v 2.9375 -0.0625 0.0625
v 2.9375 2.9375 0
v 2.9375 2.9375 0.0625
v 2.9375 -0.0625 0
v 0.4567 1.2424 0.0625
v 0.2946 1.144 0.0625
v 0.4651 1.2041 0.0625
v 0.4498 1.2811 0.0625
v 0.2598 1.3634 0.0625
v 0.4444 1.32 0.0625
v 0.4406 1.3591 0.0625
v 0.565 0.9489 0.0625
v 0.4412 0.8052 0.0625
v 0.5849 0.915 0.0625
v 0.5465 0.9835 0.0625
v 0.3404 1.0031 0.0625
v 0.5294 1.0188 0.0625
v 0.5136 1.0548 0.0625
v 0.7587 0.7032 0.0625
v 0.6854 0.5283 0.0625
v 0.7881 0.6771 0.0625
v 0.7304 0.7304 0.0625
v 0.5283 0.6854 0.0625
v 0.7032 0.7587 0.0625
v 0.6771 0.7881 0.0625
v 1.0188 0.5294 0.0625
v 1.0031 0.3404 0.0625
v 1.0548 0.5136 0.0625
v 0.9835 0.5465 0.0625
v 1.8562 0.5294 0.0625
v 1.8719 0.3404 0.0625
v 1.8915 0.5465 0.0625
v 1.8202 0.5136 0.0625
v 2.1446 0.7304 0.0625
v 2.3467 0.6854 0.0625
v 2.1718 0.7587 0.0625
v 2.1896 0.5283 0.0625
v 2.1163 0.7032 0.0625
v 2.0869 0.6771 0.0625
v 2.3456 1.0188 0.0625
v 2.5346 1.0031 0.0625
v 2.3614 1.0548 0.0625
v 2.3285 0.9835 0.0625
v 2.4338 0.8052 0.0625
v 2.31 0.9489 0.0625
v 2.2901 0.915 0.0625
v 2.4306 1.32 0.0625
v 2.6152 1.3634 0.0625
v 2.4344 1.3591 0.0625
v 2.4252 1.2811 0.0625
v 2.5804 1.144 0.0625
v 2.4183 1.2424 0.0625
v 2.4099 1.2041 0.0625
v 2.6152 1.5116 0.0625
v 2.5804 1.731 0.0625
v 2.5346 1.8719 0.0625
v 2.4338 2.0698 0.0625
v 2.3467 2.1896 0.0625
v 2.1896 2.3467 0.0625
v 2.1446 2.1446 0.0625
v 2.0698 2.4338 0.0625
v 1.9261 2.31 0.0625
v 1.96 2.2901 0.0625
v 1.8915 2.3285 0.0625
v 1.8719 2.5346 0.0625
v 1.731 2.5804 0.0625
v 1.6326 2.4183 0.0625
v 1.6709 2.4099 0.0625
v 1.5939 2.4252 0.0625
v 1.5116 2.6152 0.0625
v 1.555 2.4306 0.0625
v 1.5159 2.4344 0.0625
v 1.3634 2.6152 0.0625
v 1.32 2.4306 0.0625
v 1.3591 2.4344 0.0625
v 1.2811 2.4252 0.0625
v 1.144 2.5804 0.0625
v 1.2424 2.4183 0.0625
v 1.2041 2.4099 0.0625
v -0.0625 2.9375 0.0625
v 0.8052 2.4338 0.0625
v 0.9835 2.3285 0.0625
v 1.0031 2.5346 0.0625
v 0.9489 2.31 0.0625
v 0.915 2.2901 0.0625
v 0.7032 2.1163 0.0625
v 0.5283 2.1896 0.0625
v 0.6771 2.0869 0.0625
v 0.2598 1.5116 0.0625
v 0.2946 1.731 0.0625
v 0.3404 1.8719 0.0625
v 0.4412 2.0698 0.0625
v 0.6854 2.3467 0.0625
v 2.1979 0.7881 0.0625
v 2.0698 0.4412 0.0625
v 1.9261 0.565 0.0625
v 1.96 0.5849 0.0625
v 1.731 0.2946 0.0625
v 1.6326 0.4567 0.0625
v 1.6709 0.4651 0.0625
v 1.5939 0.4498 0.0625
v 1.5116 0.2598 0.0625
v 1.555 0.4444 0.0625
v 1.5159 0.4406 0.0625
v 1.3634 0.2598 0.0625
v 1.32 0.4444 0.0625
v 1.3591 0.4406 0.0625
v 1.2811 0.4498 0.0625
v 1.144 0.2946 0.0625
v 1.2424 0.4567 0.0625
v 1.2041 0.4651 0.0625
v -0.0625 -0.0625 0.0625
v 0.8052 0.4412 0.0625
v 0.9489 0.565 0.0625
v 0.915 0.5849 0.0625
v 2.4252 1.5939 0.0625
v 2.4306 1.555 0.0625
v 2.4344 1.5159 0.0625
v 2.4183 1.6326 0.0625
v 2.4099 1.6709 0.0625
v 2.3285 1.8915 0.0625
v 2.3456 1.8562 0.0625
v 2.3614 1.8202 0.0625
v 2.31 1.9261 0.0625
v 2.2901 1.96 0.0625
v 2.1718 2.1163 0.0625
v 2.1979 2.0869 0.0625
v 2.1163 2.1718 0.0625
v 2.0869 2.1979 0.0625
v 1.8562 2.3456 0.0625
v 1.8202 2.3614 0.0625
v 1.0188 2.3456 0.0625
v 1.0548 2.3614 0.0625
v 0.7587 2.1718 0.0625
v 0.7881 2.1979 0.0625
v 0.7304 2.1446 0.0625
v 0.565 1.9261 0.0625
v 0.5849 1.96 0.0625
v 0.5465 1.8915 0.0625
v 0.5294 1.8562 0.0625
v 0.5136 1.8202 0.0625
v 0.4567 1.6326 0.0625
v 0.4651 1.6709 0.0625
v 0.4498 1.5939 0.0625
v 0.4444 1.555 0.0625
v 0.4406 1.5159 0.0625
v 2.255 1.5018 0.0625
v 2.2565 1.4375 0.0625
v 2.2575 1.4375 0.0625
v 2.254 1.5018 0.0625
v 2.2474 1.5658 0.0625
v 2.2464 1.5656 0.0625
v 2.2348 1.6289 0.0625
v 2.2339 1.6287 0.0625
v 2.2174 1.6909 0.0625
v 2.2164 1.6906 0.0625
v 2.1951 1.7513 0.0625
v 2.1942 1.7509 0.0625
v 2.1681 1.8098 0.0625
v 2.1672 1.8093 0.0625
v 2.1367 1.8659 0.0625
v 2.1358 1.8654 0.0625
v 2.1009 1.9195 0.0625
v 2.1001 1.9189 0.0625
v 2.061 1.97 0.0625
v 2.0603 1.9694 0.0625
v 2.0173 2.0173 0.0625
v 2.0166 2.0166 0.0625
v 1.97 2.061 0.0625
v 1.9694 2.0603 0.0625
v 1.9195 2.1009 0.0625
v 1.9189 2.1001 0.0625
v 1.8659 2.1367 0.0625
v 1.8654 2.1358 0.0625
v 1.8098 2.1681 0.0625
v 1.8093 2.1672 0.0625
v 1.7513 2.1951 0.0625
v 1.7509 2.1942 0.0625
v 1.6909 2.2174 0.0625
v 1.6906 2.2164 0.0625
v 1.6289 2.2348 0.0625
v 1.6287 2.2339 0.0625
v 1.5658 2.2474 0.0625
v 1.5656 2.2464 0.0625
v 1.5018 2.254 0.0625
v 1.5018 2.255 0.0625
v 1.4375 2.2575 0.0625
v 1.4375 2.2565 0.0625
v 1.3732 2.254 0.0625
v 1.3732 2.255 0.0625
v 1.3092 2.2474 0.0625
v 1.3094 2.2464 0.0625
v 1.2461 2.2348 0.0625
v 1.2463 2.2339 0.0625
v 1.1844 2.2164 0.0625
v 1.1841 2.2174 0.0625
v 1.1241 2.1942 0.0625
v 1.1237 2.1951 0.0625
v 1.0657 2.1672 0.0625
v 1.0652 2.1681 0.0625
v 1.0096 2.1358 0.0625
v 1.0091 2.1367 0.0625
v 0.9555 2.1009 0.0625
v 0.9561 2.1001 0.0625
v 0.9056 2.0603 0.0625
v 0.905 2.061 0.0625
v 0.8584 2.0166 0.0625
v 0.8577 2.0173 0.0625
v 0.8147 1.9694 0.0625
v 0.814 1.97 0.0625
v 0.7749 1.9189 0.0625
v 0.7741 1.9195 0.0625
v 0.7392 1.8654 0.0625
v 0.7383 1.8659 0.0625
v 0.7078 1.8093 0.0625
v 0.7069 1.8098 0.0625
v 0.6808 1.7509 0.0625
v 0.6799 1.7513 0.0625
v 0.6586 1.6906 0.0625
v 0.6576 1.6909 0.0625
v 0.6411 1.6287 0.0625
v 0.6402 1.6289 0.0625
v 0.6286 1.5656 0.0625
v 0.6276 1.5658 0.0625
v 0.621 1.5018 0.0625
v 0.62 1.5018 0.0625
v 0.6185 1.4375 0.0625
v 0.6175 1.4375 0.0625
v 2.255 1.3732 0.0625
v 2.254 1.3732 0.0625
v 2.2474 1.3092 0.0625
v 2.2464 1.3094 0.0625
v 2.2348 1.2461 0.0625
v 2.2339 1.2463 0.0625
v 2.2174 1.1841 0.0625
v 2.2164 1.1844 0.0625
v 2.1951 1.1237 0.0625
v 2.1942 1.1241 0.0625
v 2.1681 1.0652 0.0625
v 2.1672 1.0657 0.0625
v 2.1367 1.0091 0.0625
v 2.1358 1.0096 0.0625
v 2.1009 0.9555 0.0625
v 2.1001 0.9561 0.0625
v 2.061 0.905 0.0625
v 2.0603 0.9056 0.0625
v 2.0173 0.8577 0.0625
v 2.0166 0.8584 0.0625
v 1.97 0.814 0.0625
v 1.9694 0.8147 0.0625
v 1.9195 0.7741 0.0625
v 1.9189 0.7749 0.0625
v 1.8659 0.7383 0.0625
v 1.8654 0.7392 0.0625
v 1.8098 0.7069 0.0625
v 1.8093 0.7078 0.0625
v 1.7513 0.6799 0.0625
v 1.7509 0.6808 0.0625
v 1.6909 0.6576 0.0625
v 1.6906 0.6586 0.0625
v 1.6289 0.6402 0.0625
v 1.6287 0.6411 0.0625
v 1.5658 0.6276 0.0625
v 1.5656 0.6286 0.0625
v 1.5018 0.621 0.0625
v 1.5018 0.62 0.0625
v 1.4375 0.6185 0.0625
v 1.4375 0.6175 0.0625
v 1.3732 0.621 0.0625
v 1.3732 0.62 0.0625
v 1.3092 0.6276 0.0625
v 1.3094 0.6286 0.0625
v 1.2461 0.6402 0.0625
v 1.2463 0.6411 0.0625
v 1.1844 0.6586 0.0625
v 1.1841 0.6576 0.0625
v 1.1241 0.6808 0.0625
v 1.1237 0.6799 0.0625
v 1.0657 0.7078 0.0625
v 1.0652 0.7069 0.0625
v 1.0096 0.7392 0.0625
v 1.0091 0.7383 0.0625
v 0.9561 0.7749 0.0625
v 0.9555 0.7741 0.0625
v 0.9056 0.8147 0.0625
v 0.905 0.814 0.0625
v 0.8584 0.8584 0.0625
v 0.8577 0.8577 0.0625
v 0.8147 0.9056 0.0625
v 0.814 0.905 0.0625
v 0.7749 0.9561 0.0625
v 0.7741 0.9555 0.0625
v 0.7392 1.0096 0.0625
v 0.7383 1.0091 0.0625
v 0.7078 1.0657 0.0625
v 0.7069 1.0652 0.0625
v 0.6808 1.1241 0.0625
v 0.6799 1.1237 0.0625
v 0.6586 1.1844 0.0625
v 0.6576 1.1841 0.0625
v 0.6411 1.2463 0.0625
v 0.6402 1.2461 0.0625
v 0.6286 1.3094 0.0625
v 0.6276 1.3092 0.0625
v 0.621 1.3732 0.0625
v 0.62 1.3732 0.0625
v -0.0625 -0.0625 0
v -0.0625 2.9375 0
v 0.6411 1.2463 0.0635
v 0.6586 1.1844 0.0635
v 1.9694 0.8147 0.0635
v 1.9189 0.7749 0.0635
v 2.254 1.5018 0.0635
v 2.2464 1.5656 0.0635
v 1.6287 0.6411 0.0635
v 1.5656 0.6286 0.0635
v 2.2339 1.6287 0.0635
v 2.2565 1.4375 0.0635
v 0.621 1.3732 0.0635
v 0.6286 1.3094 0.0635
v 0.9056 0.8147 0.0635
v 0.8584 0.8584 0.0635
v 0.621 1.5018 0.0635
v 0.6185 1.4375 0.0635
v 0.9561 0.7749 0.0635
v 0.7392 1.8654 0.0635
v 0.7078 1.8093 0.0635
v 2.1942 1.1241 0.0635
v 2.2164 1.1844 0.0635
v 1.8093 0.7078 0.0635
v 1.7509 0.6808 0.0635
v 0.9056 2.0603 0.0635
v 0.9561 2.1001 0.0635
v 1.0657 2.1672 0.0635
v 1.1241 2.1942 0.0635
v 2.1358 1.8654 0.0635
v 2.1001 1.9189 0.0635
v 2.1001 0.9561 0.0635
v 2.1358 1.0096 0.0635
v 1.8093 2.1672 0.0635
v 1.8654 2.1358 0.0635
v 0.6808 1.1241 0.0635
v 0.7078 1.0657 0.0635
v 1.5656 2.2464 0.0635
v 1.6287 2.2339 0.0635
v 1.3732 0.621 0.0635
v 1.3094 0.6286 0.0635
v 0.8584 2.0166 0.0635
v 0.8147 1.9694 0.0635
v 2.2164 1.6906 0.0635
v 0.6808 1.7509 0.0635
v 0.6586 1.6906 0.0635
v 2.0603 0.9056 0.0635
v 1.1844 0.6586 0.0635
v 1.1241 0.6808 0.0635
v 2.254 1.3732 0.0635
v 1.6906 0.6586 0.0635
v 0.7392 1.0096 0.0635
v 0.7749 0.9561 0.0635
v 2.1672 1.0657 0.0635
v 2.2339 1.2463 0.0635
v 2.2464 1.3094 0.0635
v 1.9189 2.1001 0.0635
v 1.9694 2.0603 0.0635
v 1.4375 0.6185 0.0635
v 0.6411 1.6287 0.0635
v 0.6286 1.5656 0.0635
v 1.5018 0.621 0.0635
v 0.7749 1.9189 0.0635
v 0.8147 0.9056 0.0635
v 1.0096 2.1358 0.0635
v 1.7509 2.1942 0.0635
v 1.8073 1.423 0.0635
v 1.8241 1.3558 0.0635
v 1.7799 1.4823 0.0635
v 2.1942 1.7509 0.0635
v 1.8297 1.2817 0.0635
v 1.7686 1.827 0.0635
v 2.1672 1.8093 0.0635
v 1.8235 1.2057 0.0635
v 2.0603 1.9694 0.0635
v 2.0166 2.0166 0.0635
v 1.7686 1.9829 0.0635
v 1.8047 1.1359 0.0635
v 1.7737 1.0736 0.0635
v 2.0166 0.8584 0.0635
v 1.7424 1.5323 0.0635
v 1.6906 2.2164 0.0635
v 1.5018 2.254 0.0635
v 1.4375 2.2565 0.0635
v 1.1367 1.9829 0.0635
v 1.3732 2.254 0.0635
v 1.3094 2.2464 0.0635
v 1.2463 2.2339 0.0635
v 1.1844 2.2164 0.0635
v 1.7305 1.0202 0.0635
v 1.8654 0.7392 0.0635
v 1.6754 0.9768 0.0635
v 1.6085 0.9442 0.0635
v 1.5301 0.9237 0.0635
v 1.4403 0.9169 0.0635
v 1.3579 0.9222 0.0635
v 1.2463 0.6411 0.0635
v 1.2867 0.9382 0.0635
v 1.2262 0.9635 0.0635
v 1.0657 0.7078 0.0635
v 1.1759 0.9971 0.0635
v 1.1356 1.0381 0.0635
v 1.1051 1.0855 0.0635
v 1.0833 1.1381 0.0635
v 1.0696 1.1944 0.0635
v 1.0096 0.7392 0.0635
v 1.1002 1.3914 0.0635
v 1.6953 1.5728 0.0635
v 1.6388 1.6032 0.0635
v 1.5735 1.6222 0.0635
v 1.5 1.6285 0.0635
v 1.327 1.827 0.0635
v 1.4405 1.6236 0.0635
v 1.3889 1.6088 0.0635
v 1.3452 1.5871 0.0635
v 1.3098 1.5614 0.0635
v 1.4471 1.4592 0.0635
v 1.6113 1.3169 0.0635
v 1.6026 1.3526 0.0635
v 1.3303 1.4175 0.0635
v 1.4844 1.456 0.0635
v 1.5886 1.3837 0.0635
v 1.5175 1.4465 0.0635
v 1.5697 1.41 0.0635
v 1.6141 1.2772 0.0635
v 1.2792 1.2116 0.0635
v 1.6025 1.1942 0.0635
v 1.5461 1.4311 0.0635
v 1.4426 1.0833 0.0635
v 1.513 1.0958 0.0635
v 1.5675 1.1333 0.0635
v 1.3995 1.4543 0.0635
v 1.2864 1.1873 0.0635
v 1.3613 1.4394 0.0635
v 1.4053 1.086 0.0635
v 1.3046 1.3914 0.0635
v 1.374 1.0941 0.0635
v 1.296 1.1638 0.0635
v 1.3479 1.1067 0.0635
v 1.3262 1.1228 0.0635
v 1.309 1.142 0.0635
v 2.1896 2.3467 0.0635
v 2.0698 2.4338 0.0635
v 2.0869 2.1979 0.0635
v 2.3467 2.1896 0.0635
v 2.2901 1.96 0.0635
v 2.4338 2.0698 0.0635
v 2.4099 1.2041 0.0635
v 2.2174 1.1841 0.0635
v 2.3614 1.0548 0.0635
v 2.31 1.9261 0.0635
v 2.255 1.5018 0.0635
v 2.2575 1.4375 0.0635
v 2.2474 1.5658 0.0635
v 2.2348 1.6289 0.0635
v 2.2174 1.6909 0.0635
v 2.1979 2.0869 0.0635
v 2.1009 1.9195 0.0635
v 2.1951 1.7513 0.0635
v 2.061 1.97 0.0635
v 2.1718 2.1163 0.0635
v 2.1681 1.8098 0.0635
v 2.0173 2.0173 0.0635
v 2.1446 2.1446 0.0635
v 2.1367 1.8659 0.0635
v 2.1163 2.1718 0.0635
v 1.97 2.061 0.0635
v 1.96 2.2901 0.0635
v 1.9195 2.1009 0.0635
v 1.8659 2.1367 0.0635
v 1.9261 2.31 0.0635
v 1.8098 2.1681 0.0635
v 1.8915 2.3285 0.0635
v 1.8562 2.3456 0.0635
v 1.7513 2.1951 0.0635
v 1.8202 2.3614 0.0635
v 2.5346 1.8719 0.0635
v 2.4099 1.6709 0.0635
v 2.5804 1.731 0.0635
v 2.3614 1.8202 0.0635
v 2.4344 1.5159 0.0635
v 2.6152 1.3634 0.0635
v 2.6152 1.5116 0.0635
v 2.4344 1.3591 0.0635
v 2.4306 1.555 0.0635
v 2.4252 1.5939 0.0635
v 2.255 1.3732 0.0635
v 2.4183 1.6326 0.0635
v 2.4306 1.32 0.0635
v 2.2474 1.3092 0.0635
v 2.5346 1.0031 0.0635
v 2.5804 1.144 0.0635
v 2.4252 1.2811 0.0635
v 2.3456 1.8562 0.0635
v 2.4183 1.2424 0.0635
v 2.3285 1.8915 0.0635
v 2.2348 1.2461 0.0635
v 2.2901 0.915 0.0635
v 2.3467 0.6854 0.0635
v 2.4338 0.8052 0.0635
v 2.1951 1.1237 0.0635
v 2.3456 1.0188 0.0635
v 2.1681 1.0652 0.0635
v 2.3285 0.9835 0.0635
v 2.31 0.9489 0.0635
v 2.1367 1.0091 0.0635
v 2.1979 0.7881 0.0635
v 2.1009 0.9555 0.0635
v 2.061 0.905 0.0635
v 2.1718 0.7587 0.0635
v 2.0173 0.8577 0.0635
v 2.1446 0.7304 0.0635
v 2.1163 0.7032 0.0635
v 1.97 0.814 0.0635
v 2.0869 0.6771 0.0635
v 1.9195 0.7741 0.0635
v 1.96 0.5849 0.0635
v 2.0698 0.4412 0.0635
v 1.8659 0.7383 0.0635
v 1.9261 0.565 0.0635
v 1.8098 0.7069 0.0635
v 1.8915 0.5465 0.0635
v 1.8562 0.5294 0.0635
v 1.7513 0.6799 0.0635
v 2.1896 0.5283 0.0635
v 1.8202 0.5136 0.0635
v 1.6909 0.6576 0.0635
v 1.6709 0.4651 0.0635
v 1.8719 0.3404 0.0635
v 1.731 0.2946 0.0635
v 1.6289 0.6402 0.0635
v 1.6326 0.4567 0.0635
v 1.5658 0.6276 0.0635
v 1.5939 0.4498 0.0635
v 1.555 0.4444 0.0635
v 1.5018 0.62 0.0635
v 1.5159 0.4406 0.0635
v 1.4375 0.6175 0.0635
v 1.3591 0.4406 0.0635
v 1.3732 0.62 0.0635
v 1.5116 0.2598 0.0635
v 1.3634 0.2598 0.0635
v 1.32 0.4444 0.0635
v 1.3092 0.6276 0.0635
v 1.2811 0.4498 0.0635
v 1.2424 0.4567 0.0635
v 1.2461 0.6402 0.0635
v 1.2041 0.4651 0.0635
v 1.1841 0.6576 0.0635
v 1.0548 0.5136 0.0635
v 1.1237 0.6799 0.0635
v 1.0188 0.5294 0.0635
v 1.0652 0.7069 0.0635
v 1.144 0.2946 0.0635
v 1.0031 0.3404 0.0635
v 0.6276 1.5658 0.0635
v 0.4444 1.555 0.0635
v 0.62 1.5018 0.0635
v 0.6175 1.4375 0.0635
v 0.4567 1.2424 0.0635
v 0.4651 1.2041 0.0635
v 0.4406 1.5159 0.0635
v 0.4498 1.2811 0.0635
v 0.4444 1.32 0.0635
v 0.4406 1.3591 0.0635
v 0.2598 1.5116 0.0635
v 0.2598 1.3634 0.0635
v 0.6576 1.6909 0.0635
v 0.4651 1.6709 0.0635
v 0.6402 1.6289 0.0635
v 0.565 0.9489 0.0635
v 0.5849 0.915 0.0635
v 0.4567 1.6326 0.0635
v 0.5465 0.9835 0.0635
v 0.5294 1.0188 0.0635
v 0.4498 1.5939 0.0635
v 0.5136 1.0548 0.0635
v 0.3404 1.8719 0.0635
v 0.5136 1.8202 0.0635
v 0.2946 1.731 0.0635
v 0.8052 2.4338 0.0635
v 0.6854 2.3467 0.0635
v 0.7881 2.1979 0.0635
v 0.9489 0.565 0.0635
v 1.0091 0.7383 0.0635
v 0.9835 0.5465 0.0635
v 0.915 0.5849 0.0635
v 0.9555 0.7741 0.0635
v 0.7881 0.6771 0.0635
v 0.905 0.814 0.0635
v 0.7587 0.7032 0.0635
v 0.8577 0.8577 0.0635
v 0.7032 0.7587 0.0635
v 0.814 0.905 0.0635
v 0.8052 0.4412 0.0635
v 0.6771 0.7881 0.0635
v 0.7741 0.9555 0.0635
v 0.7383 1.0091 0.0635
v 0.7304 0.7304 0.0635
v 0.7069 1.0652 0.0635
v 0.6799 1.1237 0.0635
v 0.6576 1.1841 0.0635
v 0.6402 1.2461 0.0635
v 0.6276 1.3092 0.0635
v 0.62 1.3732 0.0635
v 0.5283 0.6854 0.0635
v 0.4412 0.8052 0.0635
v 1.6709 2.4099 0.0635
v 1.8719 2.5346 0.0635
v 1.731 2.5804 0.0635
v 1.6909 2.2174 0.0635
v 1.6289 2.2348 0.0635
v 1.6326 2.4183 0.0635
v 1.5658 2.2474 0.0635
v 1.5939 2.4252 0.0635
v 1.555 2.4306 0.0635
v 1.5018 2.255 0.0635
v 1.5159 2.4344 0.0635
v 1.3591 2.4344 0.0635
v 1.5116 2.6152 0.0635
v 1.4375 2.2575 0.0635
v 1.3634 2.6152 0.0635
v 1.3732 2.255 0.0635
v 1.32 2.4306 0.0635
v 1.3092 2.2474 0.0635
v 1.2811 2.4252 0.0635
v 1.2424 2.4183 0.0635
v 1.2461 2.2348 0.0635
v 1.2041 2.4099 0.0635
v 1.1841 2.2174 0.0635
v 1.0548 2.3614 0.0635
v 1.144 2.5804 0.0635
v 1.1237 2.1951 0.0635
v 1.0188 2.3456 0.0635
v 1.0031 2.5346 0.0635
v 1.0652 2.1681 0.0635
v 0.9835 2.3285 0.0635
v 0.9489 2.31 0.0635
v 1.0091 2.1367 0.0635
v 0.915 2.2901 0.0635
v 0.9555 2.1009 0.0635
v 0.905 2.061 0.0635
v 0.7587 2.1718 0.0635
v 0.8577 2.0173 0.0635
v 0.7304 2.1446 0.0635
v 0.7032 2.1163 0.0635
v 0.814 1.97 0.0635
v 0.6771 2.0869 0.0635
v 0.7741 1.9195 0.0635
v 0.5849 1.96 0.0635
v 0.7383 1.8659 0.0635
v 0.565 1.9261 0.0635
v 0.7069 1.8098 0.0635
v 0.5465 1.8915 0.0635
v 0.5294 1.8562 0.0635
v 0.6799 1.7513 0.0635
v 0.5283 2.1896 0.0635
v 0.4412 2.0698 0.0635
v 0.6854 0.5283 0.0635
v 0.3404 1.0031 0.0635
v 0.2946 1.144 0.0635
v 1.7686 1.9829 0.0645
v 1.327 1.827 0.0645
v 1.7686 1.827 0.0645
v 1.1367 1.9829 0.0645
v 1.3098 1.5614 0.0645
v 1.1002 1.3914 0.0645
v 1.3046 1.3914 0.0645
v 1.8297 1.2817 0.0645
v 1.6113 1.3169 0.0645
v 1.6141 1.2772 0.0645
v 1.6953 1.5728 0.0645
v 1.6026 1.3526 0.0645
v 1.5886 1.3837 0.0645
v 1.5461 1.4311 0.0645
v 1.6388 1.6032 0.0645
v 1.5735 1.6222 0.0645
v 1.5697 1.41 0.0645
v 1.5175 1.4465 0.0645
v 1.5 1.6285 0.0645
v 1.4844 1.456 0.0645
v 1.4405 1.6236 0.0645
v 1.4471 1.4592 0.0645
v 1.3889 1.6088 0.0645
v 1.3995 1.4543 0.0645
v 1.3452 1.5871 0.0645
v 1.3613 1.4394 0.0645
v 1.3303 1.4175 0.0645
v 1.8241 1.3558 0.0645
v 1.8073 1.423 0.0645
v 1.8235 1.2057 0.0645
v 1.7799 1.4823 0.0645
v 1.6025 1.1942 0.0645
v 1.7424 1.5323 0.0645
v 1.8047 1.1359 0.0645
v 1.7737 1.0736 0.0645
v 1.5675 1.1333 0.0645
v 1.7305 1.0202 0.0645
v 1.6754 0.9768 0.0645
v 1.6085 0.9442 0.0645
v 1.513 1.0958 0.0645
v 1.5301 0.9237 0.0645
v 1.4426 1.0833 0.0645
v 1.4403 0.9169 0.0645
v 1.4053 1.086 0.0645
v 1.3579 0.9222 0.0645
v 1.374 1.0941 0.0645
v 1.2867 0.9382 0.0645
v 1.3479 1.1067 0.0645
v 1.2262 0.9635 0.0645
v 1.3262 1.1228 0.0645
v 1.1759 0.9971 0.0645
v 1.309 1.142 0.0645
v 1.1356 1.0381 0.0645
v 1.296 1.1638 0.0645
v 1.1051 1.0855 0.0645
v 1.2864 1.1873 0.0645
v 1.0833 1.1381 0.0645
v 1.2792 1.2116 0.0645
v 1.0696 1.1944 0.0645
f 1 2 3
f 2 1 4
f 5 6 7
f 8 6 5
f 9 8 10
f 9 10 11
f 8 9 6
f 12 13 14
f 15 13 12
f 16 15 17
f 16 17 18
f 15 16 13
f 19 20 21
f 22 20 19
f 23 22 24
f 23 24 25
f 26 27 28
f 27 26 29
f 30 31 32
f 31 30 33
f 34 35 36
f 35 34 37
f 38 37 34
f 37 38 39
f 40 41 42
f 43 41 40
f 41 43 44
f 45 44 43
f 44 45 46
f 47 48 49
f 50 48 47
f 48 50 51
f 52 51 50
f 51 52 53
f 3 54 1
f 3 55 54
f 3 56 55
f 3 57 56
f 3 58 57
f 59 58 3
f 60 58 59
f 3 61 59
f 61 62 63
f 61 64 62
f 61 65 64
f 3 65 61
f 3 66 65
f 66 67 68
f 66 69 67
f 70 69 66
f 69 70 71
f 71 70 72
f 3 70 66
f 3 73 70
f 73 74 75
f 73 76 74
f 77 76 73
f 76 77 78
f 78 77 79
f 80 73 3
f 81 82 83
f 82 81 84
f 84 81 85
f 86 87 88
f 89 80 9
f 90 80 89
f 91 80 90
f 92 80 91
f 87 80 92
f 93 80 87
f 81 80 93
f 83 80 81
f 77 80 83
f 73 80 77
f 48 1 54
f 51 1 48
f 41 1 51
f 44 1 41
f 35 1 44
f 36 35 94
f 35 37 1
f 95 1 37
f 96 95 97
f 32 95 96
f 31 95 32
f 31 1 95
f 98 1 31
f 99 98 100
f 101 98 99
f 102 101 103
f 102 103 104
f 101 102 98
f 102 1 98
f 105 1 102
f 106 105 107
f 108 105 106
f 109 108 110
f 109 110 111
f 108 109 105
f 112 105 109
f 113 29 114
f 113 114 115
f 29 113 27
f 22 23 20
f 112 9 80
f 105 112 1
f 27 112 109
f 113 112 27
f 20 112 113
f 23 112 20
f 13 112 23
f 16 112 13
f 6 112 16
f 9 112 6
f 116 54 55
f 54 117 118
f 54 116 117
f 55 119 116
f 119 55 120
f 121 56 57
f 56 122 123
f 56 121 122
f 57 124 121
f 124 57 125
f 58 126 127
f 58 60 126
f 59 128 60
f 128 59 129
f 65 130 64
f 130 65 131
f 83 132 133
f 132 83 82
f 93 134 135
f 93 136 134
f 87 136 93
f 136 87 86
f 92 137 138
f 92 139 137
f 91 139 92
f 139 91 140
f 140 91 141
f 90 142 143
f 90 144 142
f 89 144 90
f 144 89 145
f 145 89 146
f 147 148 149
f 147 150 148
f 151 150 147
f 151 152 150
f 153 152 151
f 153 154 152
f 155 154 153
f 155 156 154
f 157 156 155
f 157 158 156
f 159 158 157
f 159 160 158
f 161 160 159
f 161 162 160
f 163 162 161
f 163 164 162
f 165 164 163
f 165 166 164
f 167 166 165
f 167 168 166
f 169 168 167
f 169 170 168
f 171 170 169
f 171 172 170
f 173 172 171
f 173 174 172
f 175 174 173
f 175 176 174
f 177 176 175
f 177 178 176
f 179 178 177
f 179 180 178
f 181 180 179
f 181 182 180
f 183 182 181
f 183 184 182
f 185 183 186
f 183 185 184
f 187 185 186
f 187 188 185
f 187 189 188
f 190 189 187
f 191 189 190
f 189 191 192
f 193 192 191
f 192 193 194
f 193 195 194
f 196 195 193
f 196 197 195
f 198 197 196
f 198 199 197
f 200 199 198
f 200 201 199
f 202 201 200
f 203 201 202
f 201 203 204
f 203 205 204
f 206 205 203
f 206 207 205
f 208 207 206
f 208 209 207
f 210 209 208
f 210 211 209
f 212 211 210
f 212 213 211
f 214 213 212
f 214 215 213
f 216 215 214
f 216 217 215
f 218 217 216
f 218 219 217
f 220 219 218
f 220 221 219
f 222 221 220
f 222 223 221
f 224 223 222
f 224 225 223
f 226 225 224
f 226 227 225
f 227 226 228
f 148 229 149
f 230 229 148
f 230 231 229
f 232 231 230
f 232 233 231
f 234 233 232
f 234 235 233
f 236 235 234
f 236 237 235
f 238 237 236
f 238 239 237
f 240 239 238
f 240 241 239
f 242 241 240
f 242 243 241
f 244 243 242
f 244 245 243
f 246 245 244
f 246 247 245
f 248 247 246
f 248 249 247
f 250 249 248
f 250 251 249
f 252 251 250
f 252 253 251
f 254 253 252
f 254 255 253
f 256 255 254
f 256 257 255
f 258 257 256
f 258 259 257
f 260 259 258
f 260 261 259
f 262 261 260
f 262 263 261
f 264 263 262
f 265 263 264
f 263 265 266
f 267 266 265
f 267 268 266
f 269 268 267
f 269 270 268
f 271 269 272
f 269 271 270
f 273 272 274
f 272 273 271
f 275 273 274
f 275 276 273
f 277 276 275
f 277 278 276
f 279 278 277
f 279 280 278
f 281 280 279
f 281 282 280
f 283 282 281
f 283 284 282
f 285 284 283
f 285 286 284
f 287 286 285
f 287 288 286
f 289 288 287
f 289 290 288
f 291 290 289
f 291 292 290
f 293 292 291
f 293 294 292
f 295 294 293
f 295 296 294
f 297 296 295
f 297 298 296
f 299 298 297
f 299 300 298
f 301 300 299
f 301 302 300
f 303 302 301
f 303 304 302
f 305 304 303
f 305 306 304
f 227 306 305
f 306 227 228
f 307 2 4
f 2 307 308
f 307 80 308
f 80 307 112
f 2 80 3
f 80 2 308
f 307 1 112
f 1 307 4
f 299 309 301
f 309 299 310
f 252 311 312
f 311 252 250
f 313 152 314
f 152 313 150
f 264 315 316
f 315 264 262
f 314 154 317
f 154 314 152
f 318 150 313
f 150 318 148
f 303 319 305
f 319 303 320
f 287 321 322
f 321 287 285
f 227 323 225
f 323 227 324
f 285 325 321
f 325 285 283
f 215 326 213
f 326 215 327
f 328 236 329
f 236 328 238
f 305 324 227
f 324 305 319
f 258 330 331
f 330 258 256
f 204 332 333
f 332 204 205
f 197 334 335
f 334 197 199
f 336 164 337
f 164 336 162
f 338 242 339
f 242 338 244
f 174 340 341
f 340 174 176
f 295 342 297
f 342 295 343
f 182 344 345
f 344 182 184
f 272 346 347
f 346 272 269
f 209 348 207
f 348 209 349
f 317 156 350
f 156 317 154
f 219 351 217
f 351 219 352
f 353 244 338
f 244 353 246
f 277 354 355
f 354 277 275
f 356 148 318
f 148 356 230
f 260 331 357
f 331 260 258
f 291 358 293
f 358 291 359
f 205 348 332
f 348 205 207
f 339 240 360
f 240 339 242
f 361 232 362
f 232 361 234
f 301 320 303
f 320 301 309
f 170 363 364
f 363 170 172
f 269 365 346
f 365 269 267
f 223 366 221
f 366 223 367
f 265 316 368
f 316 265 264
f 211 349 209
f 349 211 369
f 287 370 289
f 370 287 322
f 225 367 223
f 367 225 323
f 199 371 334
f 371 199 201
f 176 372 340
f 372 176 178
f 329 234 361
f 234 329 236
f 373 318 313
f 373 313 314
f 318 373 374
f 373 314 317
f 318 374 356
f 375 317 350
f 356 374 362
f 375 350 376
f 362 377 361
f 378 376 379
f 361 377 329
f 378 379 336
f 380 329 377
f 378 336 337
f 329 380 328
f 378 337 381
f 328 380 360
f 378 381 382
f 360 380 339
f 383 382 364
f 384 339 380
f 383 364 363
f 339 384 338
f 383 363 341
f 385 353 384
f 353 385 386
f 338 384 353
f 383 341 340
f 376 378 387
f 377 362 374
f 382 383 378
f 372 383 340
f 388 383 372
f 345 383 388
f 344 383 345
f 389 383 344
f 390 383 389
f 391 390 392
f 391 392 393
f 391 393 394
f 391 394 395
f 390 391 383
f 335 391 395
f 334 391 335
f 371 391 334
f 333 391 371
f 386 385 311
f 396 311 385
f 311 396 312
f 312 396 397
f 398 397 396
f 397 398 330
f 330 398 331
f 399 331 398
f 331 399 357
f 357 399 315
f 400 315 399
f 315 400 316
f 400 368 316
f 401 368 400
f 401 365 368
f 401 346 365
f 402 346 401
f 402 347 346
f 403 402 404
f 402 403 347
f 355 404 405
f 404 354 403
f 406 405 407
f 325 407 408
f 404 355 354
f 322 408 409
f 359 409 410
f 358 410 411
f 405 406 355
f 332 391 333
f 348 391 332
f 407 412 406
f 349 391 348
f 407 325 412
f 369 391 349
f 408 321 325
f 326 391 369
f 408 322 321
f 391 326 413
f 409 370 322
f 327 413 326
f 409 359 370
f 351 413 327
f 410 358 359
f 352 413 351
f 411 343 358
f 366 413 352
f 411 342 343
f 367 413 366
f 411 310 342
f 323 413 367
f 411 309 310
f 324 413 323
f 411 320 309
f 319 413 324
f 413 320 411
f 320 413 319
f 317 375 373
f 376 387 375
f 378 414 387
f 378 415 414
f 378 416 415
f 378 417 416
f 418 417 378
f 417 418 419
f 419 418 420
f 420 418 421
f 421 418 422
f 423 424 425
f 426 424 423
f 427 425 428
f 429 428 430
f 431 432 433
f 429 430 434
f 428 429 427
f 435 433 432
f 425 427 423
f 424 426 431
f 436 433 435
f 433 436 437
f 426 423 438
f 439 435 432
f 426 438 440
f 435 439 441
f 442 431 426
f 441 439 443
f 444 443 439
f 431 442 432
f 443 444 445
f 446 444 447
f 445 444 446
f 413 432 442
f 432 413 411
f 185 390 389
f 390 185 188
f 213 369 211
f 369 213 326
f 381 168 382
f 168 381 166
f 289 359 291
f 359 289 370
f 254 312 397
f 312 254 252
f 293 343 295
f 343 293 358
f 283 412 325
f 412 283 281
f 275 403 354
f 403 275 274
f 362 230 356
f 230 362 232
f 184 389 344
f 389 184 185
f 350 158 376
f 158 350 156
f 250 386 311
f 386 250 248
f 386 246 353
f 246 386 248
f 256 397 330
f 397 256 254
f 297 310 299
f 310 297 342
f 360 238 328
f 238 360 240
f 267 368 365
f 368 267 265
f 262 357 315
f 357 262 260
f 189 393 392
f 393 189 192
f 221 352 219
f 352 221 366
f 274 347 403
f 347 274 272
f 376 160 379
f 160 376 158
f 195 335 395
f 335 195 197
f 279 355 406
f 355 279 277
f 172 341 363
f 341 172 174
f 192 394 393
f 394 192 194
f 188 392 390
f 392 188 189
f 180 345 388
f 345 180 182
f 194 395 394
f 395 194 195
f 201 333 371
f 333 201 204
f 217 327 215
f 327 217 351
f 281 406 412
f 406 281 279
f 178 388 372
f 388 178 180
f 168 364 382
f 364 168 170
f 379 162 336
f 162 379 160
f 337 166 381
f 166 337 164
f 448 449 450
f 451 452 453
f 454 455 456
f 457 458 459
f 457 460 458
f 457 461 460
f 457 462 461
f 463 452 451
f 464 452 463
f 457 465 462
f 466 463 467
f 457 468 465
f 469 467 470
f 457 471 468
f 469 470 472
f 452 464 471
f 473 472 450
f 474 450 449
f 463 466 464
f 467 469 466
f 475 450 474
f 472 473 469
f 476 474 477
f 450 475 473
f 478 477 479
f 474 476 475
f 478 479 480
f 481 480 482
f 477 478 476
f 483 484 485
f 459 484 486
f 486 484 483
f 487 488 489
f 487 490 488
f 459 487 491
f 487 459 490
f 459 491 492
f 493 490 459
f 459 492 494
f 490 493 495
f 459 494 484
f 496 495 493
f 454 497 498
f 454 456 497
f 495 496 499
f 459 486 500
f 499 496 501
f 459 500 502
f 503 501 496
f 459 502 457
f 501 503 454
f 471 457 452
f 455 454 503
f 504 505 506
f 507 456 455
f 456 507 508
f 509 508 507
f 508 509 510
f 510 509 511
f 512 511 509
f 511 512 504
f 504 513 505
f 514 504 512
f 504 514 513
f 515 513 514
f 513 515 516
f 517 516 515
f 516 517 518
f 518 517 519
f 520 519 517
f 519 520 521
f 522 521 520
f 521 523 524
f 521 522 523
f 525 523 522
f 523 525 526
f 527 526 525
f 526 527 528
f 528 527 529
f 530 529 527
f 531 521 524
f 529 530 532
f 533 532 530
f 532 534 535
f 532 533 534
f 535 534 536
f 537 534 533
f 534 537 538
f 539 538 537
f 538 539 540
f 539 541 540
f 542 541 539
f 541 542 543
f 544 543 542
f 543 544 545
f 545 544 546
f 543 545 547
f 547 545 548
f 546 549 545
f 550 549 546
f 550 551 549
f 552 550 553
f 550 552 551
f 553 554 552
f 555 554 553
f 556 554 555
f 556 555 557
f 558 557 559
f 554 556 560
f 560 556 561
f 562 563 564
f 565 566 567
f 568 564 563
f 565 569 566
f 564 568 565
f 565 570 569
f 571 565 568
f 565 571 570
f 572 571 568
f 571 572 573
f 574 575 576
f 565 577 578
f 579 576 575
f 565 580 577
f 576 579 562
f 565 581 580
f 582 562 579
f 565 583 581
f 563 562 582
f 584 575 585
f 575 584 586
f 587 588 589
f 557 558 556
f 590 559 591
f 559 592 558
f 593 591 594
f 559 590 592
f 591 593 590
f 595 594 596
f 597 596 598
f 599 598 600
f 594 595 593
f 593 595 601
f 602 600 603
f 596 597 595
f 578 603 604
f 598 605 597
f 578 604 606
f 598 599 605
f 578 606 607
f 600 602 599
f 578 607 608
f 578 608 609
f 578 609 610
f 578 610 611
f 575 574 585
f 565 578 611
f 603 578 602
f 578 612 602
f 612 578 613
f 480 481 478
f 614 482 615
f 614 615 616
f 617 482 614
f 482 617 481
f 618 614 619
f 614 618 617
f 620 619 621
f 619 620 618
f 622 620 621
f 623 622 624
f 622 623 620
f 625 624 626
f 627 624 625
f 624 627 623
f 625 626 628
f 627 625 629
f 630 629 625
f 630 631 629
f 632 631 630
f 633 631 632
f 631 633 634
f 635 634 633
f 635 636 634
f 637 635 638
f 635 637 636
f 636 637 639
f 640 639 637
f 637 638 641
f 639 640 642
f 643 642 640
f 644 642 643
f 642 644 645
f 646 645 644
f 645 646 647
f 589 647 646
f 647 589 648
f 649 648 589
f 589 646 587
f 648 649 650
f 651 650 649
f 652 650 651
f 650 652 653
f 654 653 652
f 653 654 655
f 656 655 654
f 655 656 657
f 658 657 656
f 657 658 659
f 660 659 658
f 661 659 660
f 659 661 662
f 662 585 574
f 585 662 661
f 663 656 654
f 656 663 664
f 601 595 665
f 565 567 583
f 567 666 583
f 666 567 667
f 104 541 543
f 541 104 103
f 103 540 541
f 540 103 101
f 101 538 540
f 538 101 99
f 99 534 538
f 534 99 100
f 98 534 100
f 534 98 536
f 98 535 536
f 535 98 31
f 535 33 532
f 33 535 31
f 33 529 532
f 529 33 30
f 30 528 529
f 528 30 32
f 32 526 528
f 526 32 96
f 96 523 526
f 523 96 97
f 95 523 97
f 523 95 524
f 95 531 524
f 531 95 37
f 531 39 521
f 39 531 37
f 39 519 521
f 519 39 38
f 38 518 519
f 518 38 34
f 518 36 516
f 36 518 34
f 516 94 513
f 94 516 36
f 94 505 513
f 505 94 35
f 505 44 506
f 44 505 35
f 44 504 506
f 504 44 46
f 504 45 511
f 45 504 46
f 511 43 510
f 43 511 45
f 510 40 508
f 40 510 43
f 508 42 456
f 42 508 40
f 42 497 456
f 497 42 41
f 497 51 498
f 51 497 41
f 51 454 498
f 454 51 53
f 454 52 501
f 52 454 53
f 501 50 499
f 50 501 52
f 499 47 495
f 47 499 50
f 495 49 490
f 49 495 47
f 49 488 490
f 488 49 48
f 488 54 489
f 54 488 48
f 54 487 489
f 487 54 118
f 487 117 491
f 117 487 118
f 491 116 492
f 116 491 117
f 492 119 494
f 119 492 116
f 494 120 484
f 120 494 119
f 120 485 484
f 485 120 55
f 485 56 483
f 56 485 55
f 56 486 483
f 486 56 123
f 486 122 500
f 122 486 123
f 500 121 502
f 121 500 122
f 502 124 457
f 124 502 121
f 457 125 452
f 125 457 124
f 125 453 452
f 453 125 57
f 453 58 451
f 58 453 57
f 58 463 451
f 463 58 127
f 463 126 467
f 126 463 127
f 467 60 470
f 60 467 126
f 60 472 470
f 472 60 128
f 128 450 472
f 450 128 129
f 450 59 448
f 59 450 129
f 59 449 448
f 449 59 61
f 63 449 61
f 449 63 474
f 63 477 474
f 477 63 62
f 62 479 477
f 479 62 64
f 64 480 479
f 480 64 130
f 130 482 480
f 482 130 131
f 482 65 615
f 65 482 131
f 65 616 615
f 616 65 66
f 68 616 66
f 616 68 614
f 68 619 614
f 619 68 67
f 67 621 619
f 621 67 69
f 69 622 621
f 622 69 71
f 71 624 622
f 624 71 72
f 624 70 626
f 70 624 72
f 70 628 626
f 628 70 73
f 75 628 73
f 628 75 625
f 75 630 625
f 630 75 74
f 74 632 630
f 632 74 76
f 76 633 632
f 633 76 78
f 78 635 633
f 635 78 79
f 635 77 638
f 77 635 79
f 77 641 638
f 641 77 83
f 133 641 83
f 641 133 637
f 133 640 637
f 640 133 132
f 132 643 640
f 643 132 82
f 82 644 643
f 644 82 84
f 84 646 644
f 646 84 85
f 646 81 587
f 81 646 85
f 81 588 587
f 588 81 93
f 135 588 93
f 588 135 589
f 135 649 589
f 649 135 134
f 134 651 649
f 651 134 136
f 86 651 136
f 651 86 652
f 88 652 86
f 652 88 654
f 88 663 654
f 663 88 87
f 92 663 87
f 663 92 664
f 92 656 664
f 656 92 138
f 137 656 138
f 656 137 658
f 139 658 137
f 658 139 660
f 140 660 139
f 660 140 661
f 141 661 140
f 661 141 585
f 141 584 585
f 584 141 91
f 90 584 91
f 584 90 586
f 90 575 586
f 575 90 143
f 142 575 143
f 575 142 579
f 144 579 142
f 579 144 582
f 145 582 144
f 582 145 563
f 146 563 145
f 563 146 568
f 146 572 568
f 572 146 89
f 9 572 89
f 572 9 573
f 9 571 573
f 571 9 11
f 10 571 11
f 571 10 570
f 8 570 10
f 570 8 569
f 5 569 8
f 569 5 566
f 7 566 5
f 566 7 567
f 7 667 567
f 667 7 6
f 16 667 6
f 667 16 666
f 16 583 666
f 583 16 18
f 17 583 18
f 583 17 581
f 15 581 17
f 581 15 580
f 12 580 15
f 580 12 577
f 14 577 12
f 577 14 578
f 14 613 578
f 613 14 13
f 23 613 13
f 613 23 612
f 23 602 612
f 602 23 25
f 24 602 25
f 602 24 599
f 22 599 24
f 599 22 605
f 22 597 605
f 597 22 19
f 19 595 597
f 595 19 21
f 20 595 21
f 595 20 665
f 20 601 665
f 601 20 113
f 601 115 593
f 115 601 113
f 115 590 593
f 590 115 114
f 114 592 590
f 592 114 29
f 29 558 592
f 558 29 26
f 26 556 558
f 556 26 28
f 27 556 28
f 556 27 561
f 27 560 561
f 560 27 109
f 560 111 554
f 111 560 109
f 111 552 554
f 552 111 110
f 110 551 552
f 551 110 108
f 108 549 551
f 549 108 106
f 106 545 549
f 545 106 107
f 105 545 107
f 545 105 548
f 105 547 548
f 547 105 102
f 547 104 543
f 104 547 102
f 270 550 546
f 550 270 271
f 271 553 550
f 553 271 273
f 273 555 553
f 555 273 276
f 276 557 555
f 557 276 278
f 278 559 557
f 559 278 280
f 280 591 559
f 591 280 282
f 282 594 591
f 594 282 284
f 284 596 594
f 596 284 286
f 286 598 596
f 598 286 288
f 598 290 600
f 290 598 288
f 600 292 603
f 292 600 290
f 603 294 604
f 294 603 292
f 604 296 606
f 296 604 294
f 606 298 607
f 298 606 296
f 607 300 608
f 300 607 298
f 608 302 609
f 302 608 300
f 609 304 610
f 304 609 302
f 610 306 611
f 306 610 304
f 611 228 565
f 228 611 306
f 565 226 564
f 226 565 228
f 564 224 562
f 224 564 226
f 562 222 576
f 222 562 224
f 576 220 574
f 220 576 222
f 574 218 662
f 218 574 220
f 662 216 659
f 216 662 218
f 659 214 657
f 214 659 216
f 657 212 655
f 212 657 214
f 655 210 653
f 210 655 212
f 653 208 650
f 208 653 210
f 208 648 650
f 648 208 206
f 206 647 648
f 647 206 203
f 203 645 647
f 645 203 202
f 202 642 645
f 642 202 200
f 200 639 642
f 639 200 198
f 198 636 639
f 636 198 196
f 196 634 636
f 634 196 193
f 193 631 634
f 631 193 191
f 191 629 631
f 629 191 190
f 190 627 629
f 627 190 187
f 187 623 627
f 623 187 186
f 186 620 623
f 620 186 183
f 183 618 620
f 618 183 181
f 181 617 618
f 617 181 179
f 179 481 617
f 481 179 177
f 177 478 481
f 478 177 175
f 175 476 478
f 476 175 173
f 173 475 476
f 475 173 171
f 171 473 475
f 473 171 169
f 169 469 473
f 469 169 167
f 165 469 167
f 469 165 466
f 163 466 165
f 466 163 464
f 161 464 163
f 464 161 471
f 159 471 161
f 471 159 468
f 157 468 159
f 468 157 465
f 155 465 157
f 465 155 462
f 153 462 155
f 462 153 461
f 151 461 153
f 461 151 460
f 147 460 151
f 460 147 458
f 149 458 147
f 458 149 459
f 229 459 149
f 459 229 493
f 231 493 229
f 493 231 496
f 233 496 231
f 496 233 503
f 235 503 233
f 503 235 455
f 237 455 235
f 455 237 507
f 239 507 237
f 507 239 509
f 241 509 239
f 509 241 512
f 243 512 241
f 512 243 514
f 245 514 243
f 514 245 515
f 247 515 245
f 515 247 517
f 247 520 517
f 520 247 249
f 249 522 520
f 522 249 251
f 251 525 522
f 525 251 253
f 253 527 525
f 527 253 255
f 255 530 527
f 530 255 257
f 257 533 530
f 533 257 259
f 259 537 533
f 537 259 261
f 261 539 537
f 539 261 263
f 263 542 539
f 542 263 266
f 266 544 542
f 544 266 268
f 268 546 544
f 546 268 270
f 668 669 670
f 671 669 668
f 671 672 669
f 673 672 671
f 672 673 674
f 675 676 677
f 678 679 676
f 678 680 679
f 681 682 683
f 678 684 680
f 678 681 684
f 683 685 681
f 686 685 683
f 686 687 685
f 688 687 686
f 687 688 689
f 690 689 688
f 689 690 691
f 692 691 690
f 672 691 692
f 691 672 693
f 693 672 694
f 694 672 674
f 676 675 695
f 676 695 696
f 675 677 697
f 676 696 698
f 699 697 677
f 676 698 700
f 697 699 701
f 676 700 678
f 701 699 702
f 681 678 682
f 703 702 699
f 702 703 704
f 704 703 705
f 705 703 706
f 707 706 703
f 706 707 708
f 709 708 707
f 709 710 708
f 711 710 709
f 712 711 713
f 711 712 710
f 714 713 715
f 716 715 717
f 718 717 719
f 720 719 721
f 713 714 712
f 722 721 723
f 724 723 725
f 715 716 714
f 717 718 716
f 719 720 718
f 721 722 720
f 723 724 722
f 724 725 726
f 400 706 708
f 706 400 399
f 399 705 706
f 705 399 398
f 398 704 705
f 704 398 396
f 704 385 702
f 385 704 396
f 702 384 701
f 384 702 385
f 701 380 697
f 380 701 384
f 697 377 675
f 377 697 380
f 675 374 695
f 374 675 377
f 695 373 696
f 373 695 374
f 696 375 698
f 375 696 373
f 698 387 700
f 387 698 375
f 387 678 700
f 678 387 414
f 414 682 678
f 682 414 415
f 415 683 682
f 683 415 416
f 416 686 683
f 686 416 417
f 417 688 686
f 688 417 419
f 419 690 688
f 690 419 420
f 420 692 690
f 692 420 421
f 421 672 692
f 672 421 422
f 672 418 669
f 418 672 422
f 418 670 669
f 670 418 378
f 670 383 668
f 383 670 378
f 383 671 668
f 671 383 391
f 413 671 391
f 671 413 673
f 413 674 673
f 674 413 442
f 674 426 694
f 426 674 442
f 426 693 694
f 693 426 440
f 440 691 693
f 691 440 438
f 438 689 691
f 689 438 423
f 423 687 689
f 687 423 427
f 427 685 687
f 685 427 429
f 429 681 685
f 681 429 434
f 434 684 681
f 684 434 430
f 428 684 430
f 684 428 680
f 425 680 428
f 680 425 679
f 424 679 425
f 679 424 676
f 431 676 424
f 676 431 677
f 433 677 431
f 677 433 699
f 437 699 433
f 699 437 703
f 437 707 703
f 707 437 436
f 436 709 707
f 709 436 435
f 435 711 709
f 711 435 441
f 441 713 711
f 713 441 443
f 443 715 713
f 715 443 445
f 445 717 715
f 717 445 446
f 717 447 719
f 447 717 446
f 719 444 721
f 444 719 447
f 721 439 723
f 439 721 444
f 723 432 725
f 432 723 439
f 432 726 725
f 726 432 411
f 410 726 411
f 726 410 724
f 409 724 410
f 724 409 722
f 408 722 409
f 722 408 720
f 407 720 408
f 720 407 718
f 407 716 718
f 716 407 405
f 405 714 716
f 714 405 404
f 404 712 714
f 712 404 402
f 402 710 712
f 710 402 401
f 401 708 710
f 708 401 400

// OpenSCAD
// element110-5.scad
// Gear tile variant — number "5" in the bore.

plate_w = 2 + 7/8;
plate_d = 2 + 7/8;
plate_h = 1/16;
frame_w = 1/16;

hole_d = 3/32;
hole_r = hole_d / 2;

gear_n      = 20;
gear_r_tip  = 1.18;
gear_r_root = 1.00;
gear_r_bore = 0.82;
tooth_hw    = 4.5;
tooth_tip_f = 0.80;

module rivet_holes() {
    spacing_x = plate_w / 10;
    spacing_y = plate_d / 10;
    inset_x   = spacing_x / 2;
    inset_y   = spacing_y / 2;
    for (i = [0:9]) translate([inset_x + i * spacing_x, inset_y,           -1]) cylinder(h = plate_h + 2, r = hole_r, $fn = 20);
    for (i = [0:9]) translate([inset_x + i * spacing_x, plate_d - inset_y, -1]) cylinder(h = plate_h + 2, r = hole_r, $fn = 20);
    for (i = [0:9]) translate([inset_x,           inset_y + i * spacing_y, -1]) cylinder(h = plate_h + 2, r = hole_r, $fn = 20);
    for (i = [0:9]) translate([plate_w - inset_x, inset_y + i * spacing_y, -1]) cylinder(h = plate_h + 2, r = hole_r, $fn = 20);
}

module frame() {
    color("black")
    difference() {
        translate([-frame_w, -frame_w, 0]) cube([plate_w + 2 * frame_w, plate_d + 2 * frame_w, plate_h]);
        translate([0, 0, -0.001])          cube([plate_w, plate_d, plate_h + 0.002]);
    }
}

module plate() {
    difference() {
        color("darkgray") cube([plate_w, plate_d, plate_h]);
        rivet_holes();
    }
}

rivet_h = plate_h;
module rivets() {
    spacing_x = plate_w / 10;
    spacing_y = plate_d / 10;
    inset_x   = spacing_x / 2;
    inset_y   = spacing_y / 2;
    color("lightgray") {
        for (i = [0:9]) translate([inset_x + i * spacing_x, inset_y,           0]) cylinder(h = rivet_h, r = hole_r, $fn = 20);
        for (i = [0:9]) translate([inset_x + i * spacing_x, plate_d - inset_y, 0]) cylinder(h = rivet_h, r = hole_r, $fn = 20);
        for (i = [0:9]) translate([inset_x,           inset_y + i * spacing_y, 0]) cylinder(h = rivet_h, r = hole_r, $fn = 20);
        for (i = [0:9]) translate([plate_w - inset_x, inset_y + i * spacing_y, 0]) cylinder(h = rivet_h, r = hole_r, $fn = 20);
    }
}

module gear_tooth_2d() {
    polygon([
        [gear_r_root * cos(-tooth_hw),               gear_r_root * sin(-tooth_hw)],
        [gear_r_tip  * cos(-tooth_hw * tooth_tip_f),  gear_r_tip  * sin(-tooth_hw * tooth_tip_f)],
        [gear_r_tip  * cos( tooth_hw * tooth_tip_f),  gear_r_tip  * sin( tooth_hw * tooth_tip_f)],
        [gear_r_root * cos( tooth_hw),               gear_r_root * sin( tooth_hw)],
    ]);
}

module gear_2d() {
    pitch = 360 / gear_n;
    union() {
        circle(r = gear_r_root, $fn = gear_n * 8);
        for (i = [0:gear_n - 1]) rotate([0, 0, i * pitch]) gear_tooth_2d();
    }
}

module gear() {
    color("black")
    translate([plate_w / 2, plate_d / 2, +0.001])
    linear_extrude(plate_h)
    difference() { gear_2d(); circle(r = gear_r_bore, $fn = 80); }
}

module gear_bore() {
    color([0.80, 0.80, 0.80])
    translate([plate_w / 2, plate_d / 2, 0])
    linear_extrude(plate_h + 0.001)
    circle(r = gear_r_bore - 0.001, $fn = 80);
}

frame();
plate();
rivets();
gear_bore();
gear();

module gear_label() {
    color("green")
    translate([plate_w / 2, plate_d / 2, 0])
    linear_extrude(plate_h + 0.002)
    text("5", size = 1.1, halign = "center", valign = "center",
         font = "Liberation Sans:style=Bold");
}

gear_label();
